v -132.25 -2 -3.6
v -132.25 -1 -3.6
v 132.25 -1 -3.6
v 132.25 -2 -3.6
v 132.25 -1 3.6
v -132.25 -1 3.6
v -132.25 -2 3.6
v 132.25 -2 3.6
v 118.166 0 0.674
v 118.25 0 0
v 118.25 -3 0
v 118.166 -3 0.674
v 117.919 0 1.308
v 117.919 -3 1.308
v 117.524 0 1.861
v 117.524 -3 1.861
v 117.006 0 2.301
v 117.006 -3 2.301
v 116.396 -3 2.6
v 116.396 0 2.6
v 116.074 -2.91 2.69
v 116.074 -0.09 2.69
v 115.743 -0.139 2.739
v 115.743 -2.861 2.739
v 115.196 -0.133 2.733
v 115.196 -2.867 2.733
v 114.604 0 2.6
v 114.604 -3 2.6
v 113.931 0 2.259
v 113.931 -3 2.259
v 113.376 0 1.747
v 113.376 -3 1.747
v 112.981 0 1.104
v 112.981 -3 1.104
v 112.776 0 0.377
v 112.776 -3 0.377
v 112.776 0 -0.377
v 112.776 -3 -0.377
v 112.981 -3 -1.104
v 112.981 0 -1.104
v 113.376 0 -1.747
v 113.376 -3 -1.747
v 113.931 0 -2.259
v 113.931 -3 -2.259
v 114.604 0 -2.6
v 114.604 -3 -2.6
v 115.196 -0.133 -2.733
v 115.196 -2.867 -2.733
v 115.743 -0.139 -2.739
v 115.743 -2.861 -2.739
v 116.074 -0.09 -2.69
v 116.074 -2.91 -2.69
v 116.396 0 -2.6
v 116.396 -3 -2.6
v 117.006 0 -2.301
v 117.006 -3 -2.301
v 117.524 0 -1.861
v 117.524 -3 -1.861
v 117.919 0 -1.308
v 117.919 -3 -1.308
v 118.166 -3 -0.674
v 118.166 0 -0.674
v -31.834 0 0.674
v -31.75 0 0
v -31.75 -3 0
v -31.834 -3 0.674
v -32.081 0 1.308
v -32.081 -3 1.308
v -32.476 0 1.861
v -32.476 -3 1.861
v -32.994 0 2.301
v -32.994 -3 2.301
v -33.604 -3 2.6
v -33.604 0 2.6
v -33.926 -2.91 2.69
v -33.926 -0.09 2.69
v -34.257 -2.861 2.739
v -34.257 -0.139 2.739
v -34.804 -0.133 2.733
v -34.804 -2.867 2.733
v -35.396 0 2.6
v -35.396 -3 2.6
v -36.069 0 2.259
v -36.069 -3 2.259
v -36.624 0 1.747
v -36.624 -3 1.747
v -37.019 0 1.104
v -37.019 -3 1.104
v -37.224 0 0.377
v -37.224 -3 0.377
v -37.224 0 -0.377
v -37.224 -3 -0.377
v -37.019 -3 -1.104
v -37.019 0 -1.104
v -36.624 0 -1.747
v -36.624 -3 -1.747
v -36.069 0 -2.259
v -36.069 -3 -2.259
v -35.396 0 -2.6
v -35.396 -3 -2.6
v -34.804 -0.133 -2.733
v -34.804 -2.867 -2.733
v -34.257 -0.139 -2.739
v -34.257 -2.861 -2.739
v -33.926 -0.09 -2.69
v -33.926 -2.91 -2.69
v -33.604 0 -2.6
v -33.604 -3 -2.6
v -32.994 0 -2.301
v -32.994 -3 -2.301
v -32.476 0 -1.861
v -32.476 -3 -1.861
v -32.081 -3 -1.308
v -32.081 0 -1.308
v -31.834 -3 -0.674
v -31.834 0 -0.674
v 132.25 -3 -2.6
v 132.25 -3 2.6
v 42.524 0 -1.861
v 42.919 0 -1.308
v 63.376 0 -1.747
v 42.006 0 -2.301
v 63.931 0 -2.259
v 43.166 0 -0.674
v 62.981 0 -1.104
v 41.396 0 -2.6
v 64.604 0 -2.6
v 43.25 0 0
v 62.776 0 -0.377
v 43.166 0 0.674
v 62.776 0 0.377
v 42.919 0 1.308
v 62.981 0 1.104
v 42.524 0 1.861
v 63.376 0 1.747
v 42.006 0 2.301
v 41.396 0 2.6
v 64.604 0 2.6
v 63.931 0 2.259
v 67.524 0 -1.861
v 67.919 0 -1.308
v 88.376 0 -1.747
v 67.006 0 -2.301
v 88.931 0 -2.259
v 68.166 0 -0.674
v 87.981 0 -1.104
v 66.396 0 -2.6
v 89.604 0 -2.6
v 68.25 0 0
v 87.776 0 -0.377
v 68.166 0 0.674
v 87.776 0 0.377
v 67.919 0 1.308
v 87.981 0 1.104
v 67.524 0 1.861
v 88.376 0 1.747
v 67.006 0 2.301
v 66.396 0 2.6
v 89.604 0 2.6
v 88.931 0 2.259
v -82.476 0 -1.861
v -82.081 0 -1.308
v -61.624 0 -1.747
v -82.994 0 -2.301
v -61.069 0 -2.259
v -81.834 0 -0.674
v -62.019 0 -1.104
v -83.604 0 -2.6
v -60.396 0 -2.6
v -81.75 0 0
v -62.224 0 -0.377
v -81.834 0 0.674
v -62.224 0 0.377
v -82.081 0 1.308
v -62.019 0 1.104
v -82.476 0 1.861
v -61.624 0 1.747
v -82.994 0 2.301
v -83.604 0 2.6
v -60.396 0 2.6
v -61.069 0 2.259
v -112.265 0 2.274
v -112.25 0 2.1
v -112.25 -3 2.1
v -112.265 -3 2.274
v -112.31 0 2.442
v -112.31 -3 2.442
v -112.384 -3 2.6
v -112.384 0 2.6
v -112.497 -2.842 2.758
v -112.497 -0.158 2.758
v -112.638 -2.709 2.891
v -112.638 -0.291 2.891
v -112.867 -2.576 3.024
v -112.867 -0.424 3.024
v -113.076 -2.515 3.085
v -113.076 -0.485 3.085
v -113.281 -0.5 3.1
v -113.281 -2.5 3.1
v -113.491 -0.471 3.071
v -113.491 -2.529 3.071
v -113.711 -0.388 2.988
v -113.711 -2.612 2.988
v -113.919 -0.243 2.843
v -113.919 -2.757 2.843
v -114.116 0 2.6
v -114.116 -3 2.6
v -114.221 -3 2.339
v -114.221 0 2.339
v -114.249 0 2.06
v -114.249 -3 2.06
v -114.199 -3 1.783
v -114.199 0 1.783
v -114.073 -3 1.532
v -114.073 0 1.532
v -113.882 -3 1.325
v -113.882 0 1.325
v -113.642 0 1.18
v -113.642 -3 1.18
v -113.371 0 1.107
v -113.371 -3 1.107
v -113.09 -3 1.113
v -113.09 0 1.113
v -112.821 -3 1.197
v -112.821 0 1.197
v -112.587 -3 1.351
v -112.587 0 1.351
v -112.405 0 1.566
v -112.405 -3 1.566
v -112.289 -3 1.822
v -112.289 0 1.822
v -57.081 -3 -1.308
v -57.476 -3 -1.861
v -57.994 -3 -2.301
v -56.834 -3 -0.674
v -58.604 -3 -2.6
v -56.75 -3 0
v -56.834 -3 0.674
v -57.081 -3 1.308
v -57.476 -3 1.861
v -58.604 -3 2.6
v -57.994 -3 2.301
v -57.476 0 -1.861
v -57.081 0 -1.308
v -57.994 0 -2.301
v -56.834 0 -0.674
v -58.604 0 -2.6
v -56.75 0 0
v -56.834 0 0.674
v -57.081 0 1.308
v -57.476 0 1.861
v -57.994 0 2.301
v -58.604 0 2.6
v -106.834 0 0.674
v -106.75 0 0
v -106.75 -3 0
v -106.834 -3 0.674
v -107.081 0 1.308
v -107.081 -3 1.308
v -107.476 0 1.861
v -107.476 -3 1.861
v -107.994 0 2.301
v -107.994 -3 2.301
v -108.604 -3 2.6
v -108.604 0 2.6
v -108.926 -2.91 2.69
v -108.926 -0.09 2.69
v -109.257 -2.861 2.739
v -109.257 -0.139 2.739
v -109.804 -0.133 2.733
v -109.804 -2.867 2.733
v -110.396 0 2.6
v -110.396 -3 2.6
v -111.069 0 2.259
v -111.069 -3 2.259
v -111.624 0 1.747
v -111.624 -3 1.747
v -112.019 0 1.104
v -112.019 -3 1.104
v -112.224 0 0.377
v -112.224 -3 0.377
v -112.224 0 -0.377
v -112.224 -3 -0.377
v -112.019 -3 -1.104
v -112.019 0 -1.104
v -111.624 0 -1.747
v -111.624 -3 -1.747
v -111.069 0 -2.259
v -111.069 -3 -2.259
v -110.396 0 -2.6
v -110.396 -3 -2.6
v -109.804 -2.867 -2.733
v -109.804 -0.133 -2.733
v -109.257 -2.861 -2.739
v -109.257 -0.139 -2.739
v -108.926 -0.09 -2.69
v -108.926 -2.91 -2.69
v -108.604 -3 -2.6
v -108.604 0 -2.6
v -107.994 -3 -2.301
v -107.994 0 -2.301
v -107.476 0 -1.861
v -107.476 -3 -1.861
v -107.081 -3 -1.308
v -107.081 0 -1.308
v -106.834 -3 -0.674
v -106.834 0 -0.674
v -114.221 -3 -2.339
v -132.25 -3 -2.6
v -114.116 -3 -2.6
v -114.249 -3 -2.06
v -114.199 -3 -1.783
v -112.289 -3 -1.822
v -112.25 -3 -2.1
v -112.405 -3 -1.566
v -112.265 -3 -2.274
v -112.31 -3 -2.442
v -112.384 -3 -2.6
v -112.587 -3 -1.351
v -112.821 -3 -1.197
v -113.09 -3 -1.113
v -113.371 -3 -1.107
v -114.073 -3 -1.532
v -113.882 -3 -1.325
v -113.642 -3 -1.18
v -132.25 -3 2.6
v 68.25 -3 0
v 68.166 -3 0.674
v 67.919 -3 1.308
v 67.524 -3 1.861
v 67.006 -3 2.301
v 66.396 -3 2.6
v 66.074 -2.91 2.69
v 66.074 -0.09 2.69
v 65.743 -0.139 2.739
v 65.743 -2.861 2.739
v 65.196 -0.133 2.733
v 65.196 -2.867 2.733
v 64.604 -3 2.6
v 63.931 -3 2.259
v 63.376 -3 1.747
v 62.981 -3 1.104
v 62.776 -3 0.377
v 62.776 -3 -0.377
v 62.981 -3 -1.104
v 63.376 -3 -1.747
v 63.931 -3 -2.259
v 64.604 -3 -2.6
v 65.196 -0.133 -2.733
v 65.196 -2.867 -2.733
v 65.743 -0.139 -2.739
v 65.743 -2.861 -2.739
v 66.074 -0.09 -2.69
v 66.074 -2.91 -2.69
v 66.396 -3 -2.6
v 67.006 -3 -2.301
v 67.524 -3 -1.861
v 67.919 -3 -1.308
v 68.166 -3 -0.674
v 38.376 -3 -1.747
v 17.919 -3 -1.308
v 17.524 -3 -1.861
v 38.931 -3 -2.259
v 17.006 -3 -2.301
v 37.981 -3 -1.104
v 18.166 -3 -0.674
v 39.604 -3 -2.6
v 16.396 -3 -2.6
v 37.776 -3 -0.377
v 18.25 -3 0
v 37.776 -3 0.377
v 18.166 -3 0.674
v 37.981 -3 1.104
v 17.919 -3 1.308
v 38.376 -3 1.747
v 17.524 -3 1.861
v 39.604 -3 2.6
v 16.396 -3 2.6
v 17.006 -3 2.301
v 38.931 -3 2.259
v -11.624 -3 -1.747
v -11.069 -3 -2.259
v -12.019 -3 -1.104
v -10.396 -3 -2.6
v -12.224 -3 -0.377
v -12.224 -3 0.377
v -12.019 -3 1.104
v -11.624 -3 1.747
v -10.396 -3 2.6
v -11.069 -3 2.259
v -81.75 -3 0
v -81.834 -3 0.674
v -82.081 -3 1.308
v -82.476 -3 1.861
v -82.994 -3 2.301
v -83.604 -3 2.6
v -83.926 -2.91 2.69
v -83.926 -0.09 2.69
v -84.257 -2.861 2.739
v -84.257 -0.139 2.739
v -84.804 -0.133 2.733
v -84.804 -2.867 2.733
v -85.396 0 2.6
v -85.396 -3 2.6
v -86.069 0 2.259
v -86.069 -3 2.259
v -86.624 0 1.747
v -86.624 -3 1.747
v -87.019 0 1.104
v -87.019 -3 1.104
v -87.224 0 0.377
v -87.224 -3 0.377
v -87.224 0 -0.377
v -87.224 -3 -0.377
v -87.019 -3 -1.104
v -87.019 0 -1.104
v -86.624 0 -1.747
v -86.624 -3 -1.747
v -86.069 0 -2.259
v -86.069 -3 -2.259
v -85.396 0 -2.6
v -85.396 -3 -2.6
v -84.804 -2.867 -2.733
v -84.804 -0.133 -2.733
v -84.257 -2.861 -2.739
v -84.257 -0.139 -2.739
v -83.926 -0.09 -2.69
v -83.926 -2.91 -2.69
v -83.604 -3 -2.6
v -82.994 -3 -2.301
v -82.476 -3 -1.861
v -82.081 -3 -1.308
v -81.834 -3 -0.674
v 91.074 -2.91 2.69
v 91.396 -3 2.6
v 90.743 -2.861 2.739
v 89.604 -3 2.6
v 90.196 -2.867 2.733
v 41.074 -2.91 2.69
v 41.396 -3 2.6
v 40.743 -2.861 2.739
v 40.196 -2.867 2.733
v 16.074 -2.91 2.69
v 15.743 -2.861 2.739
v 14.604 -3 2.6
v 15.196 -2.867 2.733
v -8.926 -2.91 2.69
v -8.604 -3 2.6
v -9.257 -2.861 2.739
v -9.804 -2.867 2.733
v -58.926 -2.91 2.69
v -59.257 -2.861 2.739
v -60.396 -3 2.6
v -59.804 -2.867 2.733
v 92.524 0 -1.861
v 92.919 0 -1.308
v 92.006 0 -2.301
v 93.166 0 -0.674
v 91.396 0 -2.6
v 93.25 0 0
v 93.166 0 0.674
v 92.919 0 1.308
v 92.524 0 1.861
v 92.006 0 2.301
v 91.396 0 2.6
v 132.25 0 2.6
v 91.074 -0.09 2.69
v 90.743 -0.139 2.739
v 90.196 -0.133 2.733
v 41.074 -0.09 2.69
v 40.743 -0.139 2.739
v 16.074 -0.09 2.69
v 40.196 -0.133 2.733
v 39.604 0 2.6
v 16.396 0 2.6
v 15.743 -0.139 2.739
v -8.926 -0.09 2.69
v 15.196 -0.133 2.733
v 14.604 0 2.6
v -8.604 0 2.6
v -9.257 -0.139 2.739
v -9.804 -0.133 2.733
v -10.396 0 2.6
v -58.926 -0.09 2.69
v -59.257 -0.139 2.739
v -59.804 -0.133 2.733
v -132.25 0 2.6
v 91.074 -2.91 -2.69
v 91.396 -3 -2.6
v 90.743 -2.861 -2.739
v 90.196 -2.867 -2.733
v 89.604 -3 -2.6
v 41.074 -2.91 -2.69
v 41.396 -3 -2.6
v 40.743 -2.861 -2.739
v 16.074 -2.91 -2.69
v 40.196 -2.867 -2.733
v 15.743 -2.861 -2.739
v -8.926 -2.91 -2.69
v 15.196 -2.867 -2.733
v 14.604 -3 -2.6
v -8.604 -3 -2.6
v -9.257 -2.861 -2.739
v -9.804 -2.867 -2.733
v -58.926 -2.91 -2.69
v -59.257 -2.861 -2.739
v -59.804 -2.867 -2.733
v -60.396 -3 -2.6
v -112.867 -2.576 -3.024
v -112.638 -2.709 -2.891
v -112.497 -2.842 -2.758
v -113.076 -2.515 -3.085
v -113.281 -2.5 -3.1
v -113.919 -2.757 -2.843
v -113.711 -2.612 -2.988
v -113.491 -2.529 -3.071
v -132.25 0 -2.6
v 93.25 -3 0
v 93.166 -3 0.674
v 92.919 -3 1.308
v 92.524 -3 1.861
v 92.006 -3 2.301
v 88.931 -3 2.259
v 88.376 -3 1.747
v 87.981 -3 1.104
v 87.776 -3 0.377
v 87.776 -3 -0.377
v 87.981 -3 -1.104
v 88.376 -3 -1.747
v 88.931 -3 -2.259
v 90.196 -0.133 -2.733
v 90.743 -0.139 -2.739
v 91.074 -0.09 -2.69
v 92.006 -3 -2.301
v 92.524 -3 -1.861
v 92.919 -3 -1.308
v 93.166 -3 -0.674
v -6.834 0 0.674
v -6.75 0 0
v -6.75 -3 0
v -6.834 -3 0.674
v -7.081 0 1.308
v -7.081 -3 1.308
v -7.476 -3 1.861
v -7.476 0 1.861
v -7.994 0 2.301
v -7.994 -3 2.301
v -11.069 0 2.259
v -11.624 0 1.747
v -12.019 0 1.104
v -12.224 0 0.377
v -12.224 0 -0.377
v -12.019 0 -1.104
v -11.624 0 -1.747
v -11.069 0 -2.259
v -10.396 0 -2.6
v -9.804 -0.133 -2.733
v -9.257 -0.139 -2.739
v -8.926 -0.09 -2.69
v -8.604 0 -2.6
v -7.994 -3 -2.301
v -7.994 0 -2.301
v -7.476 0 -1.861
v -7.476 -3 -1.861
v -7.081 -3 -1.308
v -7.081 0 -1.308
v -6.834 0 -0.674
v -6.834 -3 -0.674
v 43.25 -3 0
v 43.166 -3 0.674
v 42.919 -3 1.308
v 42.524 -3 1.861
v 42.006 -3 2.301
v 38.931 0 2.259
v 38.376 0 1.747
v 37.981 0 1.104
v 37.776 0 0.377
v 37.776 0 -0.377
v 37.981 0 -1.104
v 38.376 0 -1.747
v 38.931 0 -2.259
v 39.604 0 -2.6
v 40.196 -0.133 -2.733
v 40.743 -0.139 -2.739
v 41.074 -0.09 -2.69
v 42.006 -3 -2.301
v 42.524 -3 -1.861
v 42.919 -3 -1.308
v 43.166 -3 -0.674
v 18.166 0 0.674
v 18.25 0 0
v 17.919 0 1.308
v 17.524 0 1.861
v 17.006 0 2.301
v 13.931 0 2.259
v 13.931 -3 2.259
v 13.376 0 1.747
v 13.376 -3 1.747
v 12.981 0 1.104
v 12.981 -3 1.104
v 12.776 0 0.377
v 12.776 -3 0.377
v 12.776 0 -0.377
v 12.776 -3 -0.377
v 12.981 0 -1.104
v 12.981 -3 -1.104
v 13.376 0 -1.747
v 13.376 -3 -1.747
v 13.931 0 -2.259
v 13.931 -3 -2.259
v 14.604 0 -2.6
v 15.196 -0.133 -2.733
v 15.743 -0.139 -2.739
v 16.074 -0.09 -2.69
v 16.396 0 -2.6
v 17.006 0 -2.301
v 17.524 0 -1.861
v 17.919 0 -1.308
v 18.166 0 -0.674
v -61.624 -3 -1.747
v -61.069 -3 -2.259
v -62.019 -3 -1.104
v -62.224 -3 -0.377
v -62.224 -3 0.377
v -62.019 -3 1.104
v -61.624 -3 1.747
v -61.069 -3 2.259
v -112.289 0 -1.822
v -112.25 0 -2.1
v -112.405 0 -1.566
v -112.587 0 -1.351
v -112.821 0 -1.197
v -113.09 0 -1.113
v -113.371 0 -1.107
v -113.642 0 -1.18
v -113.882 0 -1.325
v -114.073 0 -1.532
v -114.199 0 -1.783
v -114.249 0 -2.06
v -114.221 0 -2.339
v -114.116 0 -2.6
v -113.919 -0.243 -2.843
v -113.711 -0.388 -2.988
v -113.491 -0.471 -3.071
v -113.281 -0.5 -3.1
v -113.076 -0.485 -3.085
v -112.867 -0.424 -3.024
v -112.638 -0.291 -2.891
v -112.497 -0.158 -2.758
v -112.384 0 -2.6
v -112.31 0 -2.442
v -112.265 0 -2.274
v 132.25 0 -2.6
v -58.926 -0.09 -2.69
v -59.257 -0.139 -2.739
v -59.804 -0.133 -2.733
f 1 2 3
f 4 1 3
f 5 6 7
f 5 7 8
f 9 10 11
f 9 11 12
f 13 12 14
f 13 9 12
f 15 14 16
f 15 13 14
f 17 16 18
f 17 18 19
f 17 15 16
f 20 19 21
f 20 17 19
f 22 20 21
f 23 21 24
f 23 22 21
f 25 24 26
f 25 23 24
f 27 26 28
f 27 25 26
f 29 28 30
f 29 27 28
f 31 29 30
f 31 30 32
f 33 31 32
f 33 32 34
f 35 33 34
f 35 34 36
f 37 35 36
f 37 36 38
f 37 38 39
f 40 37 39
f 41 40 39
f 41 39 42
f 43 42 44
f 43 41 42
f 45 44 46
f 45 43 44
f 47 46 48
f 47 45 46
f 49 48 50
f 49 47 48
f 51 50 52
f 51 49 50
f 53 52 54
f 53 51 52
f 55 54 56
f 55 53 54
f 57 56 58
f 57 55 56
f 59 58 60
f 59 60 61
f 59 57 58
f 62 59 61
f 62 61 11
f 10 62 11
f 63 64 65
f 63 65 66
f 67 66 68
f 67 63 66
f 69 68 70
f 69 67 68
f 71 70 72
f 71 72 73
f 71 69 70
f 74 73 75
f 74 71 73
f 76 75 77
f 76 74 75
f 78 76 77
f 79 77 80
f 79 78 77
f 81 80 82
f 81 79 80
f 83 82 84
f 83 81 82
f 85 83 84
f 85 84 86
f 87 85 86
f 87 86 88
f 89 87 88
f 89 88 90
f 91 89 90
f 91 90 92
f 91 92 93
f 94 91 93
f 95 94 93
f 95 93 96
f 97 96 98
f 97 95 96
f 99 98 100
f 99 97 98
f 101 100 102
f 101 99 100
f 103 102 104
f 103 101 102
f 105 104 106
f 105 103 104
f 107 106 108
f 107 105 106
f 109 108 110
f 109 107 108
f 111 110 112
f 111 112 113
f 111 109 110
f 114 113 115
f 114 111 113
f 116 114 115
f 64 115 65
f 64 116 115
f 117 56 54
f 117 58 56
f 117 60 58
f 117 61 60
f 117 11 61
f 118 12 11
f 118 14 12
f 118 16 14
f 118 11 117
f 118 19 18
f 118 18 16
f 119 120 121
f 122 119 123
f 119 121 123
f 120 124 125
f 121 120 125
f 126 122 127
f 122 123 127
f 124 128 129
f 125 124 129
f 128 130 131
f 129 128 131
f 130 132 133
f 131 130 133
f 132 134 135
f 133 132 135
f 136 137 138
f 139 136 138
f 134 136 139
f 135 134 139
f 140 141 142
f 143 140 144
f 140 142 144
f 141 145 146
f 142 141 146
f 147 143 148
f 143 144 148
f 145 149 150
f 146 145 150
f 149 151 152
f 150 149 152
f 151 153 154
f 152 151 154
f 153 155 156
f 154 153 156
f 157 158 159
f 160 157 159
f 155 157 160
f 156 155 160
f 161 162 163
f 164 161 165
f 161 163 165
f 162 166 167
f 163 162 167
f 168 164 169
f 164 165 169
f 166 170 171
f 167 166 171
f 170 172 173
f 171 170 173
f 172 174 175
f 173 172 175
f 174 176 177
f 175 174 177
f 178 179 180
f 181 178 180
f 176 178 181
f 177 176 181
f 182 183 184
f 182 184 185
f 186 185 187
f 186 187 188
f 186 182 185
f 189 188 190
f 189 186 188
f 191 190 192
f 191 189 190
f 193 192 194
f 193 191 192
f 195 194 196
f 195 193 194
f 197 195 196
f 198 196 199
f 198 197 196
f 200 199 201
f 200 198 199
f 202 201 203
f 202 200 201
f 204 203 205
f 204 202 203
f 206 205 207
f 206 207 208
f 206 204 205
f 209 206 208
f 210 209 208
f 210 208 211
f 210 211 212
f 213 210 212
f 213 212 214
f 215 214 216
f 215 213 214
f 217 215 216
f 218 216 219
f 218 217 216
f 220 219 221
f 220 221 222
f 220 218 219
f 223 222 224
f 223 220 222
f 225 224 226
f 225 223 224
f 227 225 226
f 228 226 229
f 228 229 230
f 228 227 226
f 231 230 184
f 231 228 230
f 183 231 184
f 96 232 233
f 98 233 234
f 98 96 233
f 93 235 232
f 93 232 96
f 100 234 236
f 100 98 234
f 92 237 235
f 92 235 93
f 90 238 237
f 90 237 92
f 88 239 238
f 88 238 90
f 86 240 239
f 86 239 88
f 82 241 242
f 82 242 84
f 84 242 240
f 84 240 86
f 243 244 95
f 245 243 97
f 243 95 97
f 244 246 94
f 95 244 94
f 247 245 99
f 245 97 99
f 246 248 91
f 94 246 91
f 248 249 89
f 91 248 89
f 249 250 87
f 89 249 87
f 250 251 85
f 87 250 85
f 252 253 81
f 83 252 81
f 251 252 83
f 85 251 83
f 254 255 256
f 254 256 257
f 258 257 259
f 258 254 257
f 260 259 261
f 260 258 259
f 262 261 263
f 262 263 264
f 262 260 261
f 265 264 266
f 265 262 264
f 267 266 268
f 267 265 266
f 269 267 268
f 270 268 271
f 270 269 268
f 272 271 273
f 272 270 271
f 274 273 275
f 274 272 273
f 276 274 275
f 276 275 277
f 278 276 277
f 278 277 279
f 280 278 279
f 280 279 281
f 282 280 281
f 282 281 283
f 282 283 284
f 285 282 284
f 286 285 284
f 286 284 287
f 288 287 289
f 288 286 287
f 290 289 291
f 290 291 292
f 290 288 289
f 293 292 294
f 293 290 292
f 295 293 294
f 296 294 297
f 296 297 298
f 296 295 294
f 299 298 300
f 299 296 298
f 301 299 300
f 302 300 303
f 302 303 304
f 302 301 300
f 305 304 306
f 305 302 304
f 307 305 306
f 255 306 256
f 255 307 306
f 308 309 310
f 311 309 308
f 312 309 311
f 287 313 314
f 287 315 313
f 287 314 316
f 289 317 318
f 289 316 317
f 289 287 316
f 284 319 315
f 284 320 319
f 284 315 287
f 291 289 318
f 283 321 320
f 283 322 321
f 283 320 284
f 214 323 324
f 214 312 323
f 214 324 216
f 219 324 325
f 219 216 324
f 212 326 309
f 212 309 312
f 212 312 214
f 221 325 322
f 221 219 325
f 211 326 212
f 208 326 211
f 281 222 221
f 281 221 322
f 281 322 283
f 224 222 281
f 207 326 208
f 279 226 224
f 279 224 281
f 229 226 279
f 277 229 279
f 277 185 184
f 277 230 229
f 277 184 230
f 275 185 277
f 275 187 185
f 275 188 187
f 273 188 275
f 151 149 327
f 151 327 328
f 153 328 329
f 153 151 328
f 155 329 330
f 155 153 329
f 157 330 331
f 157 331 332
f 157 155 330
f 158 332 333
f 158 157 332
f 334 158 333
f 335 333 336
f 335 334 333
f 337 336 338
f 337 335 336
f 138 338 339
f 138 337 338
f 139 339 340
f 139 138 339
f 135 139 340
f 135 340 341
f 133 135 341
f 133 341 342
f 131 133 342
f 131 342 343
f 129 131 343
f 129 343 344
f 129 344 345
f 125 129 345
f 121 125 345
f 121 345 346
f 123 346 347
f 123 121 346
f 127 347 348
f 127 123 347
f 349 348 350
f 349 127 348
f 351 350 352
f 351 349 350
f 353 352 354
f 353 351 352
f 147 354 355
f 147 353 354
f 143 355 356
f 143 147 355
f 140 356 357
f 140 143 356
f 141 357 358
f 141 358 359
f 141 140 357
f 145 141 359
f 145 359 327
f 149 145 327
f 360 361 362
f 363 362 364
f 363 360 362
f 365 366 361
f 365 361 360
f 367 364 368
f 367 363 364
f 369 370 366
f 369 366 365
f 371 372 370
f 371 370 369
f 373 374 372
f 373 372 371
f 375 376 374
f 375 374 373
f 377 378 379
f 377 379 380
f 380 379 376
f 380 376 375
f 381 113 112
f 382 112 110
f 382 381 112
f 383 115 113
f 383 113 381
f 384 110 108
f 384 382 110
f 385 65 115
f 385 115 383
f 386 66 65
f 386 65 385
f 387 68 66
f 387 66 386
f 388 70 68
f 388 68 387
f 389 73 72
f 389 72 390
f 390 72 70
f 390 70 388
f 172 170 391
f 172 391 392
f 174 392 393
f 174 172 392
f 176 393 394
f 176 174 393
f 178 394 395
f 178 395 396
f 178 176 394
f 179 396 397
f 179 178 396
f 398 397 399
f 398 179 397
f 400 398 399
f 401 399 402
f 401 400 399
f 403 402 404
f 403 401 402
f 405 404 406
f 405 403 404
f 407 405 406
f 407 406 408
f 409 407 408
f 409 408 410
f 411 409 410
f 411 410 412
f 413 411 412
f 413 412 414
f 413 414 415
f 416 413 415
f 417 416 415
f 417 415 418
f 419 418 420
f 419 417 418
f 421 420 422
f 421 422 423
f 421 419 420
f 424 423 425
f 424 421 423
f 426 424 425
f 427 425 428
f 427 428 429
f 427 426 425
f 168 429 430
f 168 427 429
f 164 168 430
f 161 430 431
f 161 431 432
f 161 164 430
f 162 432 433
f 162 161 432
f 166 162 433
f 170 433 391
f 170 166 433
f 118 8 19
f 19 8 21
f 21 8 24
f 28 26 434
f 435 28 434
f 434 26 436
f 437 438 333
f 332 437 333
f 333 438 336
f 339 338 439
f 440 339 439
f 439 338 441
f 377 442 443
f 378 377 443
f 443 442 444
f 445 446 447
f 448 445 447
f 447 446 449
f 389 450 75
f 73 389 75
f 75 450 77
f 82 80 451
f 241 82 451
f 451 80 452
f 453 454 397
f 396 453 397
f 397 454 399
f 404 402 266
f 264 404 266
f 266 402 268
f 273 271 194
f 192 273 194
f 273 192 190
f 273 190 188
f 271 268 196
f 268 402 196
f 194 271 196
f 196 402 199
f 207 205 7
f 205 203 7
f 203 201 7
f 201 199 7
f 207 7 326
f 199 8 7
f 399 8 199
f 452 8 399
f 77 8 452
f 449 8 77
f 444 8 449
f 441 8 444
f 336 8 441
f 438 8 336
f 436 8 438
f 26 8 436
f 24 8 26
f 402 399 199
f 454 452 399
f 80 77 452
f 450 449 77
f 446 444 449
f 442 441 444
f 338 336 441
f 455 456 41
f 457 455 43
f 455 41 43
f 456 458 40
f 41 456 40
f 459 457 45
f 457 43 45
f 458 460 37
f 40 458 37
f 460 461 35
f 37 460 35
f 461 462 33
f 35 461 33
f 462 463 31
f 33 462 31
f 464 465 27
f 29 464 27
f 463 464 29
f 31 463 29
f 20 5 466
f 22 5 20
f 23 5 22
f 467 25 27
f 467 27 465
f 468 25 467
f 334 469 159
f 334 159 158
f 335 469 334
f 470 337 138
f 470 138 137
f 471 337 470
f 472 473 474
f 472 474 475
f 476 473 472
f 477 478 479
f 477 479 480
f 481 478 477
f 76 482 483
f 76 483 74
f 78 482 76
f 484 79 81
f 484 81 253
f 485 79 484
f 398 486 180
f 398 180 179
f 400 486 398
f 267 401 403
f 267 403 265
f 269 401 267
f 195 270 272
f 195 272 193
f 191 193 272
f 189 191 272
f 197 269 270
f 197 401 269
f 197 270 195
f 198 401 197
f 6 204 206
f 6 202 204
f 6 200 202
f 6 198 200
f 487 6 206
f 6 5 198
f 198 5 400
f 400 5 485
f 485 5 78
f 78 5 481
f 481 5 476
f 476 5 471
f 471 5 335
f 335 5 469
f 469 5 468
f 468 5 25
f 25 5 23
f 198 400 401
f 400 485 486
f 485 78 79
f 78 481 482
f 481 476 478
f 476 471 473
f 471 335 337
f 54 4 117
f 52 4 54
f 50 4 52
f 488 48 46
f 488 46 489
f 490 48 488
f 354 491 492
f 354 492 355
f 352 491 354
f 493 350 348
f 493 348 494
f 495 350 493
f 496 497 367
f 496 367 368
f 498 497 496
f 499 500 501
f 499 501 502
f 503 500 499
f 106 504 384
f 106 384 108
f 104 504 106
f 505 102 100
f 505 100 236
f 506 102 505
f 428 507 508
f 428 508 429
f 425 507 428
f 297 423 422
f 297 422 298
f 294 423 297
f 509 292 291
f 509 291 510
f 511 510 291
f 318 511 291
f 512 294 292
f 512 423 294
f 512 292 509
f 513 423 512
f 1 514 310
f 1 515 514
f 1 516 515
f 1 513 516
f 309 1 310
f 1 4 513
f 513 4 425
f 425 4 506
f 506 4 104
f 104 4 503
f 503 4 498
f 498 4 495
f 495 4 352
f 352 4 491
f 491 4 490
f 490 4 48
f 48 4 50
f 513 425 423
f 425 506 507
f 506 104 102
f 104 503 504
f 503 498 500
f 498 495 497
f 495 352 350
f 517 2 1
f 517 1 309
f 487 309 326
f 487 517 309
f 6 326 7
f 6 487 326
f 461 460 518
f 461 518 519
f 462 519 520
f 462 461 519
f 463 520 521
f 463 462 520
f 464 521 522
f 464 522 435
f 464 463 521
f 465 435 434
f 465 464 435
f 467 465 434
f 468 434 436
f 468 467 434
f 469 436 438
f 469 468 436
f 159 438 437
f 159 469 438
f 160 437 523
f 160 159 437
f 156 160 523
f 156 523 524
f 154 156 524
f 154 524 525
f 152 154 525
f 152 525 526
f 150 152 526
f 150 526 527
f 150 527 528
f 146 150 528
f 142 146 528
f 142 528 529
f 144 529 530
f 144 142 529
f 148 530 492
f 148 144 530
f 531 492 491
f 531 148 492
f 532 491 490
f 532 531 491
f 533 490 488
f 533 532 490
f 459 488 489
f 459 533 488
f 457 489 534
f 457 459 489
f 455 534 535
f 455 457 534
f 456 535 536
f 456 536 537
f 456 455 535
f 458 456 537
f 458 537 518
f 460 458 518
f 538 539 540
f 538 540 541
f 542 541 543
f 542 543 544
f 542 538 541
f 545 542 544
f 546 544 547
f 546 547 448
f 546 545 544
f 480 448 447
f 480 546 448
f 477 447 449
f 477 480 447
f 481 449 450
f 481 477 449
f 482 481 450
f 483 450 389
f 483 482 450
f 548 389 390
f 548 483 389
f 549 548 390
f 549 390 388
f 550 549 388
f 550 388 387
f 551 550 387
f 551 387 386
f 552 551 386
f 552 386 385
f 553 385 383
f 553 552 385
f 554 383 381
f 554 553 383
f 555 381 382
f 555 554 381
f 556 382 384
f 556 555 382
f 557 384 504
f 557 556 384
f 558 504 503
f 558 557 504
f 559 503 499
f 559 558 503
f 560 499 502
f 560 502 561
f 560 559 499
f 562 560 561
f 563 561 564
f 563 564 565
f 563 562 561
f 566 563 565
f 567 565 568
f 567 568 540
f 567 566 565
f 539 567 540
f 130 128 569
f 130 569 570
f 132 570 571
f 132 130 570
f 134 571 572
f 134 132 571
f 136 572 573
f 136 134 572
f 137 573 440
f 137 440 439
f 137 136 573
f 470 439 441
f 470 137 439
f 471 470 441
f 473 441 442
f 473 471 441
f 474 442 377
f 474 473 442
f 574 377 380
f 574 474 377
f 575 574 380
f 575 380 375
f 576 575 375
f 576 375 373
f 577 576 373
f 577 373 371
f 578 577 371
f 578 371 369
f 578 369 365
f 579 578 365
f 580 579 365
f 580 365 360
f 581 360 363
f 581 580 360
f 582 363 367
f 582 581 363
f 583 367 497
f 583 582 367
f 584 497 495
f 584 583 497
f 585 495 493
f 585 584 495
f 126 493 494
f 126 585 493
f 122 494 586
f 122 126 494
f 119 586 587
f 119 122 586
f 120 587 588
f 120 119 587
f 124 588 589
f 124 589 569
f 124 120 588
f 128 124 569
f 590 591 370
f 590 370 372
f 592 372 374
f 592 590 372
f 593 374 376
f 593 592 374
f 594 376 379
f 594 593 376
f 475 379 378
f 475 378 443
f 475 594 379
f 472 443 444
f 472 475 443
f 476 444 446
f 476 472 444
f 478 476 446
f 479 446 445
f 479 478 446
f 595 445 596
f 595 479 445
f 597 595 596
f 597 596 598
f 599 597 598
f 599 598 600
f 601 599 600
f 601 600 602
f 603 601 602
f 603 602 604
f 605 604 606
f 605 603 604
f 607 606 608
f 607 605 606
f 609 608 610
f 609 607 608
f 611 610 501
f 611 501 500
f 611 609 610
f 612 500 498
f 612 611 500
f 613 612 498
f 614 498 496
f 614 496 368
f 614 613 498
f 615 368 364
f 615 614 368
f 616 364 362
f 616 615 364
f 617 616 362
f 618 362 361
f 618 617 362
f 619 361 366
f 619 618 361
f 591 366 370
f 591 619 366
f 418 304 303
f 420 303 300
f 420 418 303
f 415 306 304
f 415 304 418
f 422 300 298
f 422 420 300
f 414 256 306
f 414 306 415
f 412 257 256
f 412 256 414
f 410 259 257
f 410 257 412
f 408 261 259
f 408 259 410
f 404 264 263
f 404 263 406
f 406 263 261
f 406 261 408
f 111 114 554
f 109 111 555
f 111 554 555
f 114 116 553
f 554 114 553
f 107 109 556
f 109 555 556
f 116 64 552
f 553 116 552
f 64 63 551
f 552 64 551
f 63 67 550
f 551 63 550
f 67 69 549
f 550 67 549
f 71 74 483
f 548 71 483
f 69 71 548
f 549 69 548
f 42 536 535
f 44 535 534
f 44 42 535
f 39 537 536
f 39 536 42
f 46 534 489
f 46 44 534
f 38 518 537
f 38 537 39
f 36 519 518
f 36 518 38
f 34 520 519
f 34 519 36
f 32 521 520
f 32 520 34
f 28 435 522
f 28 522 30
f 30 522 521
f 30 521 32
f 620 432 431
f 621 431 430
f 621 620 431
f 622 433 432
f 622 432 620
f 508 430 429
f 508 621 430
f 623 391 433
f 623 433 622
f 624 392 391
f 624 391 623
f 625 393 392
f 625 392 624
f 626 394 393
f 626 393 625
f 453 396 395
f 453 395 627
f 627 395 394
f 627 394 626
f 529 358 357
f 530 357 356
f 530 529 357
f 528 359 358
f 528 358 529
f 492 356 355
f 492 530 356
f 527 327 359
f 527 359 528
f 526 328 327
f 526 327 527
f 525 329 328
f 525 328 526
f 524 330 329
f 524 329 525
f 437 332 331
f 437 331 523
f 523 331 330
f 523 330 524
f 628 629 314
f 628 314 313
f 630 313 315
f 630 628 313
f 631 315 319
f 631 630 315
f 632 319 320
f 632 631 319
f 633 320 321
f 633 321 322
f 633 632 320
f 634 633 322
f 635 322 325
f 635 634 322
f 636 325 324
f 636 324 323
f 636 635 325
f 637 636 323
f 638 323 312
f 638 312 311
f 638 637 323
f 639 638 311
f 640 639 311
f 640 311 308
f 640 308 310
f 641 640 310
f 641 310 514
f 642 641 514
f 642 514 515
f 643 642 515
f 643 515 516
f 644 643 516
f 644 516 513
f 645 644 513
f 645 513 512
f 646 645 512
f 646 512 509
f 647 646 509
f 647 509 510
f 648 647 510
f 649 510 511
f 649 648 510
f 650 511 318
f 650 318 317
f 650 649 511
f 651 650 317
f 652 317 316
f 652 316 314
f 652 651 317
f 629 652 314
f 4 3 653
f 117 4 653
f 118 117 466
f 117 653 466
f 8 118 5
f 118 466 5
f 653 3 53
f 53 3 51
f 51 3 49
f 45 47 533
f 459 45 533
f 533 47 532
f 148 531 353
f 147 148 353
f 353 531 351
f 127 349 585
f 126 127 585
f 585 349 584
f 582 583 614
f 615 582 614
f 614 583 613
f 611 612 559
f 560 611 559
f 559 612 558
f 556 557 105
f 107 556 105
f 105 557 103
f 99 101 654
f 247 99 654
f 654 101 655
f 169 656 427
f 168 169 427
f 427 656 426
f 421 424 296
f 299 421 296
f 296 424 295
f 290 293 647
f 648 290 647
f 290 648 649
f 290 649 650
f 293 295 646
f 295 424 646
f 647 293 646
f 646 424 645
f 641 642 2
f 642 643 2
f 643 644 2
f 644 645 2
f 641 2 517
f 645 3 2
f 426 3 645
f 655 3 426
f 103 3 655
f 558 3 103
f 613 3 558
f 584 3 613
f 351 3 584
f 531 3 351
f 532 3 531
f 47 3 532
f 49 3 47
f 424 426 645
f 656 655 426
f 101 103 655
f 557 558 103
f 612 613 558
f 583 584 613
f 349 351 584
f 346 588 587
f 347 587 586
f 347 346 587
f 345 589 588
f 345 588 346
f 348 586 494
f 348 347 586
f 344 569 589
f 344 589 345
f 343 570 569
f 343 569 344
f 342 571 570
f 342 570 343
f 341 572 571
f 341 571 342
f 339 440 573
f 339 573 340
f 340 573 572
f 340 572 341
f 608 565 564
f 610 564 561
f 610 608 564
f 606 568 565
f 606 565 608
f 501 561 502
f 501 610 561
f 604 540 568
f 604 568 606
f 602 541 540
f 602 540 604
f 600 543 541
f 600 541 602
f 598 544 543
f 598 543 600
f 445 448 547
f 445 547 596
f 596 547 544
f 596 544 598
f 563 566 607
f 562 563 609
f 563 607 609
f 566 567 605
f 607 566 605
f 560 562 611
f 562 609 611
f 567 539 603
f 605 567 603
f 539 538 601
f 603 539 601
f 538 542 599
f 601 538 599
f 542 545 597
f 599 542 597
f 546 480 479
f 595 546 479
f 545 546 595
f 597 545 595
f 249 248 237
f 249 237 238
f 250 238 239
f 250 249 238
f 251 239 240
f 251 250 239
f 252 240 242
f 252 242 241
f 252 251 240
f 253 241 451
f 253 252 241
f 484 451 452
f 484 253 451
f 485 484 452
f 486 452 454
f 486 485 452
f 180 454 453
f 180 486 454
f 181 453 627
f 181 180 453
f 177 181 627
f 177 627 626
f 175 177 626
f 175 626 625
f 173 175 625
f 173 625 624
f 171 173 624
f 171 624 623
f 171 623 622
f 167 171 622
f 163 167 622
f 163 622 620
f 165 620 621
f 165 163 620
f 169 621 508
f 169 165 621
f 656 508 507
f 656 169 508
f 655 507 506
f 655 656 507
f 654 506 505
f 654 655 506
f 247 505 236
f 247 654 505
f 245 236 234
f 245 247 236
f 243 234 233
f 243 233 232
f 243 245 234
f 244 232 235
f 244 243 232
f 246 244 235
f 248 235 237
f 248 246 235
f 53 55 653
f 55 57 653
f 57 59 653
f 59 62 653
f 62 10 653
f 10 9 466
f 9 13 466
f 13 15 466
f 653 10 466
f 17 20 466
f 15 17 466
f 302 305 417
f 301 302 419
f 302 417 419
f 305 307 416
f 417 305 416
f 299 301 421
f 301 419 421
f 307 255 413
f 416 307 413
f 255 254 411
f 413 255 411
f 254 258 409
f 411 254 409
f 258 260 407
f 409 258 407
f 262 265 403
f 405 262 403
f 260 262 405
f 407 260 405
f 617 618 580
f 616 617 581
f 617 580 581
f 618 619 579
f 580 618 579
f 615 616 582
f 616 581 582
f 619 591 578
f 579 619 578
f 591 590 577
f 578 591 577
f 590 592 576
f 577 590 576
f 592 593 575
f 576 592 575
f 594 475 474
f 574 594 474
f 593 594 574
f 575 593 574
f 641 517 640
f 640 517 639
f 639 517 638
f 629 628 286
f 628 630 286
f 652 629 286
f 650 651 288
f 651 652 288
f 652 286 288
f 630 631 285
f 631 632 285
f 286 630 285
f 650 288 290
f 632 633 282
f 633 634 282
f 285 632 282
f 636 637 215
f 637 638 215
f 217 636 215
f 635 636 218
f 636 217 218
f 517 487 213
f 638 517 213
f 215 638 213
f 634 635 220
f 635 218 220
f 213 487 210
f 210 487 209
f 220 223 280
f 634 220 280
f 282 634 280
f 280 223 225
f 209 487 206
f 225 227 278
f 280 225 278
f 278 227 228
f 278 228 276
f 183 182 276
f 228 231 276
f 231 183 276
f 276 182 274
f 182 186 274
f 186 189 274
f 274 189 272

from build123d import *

# Parameters (mm, degrees)
F0_W        = 264.5
F0_H        = 7.2
F0_R        = 1
F0_R_2      = 2.75
F1_DEPTH    = 3
F2_T1_DEPTH = 269.6433659759


# Not quite as in the source:
# - a fillet or chamfer that OpenCascade refuses, or shapes differently, is made with other operations: its cross-section is extruded or revolved along the edge and cut away or added


with BuildPart() as f1:
    # F0 (on Front) → F1 (new body)
    with BuildSketch(Plane.XZ):
        Rectangle(F0_W, F0_H)
        with Locations((-113.25, -2.1)):
            Circle(F0_R, mode=Mode.SUBTRACT)
        with Locations((-109.5, 0)):
            Circle(F0_R_2, mode=Mode.SUBTRACT)
        with Locations((-84.5, 0)):
            Circle(F0_R_2, mode=Mode.SUBTRACT)
        with Locations((-59.5, 0)):
            Circle(F0_R_2, mode=Mode.SUBTRACT)
        with Locations((-34.5, 0)):
            Circle(F0_R_2, mode=Mode.SUBTRACT)
        with Locations((-9.5, 0)):
            Circle(F0_R_2, mode=Mode.SUBTRACT)
        with Locations((-113.25, 2.1)):
            Circle(F0_R, mode=Mode.SUBTRACT)
        with Locations((15.5, 0)):
            Circle(F0_R_2, mode=Mode.SUBTRACT)
        with Locations((40.5, 0)):
            Circle(F0_R_2, mode=Mode.SUBTRACT)
        with Locations((65.5, 0)):
            Circle(F0_R_2, mode=Mode.SUBTRACT)
        with Locations((90.5, 0)):
            Circle(F0_R_2, mode=Mode.SUBTRACT)
        with Locations((115.5, 0)):
            Circle(F0_R_2, mode=Mode.SUBTRACT)
    extrude(amount=F1_DEPTH)

    # F2: chamfer of 1 on 4 edges, made by hand

    # F2_s2 → F2_t1 (cut)
    with BuildSketch(Plane.YZ.offset(-134.821682988)):
        Polygon((-2, -3.6), (-3, -2.6), (-3, -3.6), align=None)
        Polygon((-1, -3.6), (0, -2.6), (0, -3.6), align=None)
        Polygon((-1, 3.6), (0, 2.6), (0, 3.6), align=None)
        Polygon((-2, 3.6), (-3, 2.6), (-3, 3.6), align=None)
    extrude(amount=F2_T1_DEPTH, mode=Mode.SUBTRACT)


solid = f1.part
